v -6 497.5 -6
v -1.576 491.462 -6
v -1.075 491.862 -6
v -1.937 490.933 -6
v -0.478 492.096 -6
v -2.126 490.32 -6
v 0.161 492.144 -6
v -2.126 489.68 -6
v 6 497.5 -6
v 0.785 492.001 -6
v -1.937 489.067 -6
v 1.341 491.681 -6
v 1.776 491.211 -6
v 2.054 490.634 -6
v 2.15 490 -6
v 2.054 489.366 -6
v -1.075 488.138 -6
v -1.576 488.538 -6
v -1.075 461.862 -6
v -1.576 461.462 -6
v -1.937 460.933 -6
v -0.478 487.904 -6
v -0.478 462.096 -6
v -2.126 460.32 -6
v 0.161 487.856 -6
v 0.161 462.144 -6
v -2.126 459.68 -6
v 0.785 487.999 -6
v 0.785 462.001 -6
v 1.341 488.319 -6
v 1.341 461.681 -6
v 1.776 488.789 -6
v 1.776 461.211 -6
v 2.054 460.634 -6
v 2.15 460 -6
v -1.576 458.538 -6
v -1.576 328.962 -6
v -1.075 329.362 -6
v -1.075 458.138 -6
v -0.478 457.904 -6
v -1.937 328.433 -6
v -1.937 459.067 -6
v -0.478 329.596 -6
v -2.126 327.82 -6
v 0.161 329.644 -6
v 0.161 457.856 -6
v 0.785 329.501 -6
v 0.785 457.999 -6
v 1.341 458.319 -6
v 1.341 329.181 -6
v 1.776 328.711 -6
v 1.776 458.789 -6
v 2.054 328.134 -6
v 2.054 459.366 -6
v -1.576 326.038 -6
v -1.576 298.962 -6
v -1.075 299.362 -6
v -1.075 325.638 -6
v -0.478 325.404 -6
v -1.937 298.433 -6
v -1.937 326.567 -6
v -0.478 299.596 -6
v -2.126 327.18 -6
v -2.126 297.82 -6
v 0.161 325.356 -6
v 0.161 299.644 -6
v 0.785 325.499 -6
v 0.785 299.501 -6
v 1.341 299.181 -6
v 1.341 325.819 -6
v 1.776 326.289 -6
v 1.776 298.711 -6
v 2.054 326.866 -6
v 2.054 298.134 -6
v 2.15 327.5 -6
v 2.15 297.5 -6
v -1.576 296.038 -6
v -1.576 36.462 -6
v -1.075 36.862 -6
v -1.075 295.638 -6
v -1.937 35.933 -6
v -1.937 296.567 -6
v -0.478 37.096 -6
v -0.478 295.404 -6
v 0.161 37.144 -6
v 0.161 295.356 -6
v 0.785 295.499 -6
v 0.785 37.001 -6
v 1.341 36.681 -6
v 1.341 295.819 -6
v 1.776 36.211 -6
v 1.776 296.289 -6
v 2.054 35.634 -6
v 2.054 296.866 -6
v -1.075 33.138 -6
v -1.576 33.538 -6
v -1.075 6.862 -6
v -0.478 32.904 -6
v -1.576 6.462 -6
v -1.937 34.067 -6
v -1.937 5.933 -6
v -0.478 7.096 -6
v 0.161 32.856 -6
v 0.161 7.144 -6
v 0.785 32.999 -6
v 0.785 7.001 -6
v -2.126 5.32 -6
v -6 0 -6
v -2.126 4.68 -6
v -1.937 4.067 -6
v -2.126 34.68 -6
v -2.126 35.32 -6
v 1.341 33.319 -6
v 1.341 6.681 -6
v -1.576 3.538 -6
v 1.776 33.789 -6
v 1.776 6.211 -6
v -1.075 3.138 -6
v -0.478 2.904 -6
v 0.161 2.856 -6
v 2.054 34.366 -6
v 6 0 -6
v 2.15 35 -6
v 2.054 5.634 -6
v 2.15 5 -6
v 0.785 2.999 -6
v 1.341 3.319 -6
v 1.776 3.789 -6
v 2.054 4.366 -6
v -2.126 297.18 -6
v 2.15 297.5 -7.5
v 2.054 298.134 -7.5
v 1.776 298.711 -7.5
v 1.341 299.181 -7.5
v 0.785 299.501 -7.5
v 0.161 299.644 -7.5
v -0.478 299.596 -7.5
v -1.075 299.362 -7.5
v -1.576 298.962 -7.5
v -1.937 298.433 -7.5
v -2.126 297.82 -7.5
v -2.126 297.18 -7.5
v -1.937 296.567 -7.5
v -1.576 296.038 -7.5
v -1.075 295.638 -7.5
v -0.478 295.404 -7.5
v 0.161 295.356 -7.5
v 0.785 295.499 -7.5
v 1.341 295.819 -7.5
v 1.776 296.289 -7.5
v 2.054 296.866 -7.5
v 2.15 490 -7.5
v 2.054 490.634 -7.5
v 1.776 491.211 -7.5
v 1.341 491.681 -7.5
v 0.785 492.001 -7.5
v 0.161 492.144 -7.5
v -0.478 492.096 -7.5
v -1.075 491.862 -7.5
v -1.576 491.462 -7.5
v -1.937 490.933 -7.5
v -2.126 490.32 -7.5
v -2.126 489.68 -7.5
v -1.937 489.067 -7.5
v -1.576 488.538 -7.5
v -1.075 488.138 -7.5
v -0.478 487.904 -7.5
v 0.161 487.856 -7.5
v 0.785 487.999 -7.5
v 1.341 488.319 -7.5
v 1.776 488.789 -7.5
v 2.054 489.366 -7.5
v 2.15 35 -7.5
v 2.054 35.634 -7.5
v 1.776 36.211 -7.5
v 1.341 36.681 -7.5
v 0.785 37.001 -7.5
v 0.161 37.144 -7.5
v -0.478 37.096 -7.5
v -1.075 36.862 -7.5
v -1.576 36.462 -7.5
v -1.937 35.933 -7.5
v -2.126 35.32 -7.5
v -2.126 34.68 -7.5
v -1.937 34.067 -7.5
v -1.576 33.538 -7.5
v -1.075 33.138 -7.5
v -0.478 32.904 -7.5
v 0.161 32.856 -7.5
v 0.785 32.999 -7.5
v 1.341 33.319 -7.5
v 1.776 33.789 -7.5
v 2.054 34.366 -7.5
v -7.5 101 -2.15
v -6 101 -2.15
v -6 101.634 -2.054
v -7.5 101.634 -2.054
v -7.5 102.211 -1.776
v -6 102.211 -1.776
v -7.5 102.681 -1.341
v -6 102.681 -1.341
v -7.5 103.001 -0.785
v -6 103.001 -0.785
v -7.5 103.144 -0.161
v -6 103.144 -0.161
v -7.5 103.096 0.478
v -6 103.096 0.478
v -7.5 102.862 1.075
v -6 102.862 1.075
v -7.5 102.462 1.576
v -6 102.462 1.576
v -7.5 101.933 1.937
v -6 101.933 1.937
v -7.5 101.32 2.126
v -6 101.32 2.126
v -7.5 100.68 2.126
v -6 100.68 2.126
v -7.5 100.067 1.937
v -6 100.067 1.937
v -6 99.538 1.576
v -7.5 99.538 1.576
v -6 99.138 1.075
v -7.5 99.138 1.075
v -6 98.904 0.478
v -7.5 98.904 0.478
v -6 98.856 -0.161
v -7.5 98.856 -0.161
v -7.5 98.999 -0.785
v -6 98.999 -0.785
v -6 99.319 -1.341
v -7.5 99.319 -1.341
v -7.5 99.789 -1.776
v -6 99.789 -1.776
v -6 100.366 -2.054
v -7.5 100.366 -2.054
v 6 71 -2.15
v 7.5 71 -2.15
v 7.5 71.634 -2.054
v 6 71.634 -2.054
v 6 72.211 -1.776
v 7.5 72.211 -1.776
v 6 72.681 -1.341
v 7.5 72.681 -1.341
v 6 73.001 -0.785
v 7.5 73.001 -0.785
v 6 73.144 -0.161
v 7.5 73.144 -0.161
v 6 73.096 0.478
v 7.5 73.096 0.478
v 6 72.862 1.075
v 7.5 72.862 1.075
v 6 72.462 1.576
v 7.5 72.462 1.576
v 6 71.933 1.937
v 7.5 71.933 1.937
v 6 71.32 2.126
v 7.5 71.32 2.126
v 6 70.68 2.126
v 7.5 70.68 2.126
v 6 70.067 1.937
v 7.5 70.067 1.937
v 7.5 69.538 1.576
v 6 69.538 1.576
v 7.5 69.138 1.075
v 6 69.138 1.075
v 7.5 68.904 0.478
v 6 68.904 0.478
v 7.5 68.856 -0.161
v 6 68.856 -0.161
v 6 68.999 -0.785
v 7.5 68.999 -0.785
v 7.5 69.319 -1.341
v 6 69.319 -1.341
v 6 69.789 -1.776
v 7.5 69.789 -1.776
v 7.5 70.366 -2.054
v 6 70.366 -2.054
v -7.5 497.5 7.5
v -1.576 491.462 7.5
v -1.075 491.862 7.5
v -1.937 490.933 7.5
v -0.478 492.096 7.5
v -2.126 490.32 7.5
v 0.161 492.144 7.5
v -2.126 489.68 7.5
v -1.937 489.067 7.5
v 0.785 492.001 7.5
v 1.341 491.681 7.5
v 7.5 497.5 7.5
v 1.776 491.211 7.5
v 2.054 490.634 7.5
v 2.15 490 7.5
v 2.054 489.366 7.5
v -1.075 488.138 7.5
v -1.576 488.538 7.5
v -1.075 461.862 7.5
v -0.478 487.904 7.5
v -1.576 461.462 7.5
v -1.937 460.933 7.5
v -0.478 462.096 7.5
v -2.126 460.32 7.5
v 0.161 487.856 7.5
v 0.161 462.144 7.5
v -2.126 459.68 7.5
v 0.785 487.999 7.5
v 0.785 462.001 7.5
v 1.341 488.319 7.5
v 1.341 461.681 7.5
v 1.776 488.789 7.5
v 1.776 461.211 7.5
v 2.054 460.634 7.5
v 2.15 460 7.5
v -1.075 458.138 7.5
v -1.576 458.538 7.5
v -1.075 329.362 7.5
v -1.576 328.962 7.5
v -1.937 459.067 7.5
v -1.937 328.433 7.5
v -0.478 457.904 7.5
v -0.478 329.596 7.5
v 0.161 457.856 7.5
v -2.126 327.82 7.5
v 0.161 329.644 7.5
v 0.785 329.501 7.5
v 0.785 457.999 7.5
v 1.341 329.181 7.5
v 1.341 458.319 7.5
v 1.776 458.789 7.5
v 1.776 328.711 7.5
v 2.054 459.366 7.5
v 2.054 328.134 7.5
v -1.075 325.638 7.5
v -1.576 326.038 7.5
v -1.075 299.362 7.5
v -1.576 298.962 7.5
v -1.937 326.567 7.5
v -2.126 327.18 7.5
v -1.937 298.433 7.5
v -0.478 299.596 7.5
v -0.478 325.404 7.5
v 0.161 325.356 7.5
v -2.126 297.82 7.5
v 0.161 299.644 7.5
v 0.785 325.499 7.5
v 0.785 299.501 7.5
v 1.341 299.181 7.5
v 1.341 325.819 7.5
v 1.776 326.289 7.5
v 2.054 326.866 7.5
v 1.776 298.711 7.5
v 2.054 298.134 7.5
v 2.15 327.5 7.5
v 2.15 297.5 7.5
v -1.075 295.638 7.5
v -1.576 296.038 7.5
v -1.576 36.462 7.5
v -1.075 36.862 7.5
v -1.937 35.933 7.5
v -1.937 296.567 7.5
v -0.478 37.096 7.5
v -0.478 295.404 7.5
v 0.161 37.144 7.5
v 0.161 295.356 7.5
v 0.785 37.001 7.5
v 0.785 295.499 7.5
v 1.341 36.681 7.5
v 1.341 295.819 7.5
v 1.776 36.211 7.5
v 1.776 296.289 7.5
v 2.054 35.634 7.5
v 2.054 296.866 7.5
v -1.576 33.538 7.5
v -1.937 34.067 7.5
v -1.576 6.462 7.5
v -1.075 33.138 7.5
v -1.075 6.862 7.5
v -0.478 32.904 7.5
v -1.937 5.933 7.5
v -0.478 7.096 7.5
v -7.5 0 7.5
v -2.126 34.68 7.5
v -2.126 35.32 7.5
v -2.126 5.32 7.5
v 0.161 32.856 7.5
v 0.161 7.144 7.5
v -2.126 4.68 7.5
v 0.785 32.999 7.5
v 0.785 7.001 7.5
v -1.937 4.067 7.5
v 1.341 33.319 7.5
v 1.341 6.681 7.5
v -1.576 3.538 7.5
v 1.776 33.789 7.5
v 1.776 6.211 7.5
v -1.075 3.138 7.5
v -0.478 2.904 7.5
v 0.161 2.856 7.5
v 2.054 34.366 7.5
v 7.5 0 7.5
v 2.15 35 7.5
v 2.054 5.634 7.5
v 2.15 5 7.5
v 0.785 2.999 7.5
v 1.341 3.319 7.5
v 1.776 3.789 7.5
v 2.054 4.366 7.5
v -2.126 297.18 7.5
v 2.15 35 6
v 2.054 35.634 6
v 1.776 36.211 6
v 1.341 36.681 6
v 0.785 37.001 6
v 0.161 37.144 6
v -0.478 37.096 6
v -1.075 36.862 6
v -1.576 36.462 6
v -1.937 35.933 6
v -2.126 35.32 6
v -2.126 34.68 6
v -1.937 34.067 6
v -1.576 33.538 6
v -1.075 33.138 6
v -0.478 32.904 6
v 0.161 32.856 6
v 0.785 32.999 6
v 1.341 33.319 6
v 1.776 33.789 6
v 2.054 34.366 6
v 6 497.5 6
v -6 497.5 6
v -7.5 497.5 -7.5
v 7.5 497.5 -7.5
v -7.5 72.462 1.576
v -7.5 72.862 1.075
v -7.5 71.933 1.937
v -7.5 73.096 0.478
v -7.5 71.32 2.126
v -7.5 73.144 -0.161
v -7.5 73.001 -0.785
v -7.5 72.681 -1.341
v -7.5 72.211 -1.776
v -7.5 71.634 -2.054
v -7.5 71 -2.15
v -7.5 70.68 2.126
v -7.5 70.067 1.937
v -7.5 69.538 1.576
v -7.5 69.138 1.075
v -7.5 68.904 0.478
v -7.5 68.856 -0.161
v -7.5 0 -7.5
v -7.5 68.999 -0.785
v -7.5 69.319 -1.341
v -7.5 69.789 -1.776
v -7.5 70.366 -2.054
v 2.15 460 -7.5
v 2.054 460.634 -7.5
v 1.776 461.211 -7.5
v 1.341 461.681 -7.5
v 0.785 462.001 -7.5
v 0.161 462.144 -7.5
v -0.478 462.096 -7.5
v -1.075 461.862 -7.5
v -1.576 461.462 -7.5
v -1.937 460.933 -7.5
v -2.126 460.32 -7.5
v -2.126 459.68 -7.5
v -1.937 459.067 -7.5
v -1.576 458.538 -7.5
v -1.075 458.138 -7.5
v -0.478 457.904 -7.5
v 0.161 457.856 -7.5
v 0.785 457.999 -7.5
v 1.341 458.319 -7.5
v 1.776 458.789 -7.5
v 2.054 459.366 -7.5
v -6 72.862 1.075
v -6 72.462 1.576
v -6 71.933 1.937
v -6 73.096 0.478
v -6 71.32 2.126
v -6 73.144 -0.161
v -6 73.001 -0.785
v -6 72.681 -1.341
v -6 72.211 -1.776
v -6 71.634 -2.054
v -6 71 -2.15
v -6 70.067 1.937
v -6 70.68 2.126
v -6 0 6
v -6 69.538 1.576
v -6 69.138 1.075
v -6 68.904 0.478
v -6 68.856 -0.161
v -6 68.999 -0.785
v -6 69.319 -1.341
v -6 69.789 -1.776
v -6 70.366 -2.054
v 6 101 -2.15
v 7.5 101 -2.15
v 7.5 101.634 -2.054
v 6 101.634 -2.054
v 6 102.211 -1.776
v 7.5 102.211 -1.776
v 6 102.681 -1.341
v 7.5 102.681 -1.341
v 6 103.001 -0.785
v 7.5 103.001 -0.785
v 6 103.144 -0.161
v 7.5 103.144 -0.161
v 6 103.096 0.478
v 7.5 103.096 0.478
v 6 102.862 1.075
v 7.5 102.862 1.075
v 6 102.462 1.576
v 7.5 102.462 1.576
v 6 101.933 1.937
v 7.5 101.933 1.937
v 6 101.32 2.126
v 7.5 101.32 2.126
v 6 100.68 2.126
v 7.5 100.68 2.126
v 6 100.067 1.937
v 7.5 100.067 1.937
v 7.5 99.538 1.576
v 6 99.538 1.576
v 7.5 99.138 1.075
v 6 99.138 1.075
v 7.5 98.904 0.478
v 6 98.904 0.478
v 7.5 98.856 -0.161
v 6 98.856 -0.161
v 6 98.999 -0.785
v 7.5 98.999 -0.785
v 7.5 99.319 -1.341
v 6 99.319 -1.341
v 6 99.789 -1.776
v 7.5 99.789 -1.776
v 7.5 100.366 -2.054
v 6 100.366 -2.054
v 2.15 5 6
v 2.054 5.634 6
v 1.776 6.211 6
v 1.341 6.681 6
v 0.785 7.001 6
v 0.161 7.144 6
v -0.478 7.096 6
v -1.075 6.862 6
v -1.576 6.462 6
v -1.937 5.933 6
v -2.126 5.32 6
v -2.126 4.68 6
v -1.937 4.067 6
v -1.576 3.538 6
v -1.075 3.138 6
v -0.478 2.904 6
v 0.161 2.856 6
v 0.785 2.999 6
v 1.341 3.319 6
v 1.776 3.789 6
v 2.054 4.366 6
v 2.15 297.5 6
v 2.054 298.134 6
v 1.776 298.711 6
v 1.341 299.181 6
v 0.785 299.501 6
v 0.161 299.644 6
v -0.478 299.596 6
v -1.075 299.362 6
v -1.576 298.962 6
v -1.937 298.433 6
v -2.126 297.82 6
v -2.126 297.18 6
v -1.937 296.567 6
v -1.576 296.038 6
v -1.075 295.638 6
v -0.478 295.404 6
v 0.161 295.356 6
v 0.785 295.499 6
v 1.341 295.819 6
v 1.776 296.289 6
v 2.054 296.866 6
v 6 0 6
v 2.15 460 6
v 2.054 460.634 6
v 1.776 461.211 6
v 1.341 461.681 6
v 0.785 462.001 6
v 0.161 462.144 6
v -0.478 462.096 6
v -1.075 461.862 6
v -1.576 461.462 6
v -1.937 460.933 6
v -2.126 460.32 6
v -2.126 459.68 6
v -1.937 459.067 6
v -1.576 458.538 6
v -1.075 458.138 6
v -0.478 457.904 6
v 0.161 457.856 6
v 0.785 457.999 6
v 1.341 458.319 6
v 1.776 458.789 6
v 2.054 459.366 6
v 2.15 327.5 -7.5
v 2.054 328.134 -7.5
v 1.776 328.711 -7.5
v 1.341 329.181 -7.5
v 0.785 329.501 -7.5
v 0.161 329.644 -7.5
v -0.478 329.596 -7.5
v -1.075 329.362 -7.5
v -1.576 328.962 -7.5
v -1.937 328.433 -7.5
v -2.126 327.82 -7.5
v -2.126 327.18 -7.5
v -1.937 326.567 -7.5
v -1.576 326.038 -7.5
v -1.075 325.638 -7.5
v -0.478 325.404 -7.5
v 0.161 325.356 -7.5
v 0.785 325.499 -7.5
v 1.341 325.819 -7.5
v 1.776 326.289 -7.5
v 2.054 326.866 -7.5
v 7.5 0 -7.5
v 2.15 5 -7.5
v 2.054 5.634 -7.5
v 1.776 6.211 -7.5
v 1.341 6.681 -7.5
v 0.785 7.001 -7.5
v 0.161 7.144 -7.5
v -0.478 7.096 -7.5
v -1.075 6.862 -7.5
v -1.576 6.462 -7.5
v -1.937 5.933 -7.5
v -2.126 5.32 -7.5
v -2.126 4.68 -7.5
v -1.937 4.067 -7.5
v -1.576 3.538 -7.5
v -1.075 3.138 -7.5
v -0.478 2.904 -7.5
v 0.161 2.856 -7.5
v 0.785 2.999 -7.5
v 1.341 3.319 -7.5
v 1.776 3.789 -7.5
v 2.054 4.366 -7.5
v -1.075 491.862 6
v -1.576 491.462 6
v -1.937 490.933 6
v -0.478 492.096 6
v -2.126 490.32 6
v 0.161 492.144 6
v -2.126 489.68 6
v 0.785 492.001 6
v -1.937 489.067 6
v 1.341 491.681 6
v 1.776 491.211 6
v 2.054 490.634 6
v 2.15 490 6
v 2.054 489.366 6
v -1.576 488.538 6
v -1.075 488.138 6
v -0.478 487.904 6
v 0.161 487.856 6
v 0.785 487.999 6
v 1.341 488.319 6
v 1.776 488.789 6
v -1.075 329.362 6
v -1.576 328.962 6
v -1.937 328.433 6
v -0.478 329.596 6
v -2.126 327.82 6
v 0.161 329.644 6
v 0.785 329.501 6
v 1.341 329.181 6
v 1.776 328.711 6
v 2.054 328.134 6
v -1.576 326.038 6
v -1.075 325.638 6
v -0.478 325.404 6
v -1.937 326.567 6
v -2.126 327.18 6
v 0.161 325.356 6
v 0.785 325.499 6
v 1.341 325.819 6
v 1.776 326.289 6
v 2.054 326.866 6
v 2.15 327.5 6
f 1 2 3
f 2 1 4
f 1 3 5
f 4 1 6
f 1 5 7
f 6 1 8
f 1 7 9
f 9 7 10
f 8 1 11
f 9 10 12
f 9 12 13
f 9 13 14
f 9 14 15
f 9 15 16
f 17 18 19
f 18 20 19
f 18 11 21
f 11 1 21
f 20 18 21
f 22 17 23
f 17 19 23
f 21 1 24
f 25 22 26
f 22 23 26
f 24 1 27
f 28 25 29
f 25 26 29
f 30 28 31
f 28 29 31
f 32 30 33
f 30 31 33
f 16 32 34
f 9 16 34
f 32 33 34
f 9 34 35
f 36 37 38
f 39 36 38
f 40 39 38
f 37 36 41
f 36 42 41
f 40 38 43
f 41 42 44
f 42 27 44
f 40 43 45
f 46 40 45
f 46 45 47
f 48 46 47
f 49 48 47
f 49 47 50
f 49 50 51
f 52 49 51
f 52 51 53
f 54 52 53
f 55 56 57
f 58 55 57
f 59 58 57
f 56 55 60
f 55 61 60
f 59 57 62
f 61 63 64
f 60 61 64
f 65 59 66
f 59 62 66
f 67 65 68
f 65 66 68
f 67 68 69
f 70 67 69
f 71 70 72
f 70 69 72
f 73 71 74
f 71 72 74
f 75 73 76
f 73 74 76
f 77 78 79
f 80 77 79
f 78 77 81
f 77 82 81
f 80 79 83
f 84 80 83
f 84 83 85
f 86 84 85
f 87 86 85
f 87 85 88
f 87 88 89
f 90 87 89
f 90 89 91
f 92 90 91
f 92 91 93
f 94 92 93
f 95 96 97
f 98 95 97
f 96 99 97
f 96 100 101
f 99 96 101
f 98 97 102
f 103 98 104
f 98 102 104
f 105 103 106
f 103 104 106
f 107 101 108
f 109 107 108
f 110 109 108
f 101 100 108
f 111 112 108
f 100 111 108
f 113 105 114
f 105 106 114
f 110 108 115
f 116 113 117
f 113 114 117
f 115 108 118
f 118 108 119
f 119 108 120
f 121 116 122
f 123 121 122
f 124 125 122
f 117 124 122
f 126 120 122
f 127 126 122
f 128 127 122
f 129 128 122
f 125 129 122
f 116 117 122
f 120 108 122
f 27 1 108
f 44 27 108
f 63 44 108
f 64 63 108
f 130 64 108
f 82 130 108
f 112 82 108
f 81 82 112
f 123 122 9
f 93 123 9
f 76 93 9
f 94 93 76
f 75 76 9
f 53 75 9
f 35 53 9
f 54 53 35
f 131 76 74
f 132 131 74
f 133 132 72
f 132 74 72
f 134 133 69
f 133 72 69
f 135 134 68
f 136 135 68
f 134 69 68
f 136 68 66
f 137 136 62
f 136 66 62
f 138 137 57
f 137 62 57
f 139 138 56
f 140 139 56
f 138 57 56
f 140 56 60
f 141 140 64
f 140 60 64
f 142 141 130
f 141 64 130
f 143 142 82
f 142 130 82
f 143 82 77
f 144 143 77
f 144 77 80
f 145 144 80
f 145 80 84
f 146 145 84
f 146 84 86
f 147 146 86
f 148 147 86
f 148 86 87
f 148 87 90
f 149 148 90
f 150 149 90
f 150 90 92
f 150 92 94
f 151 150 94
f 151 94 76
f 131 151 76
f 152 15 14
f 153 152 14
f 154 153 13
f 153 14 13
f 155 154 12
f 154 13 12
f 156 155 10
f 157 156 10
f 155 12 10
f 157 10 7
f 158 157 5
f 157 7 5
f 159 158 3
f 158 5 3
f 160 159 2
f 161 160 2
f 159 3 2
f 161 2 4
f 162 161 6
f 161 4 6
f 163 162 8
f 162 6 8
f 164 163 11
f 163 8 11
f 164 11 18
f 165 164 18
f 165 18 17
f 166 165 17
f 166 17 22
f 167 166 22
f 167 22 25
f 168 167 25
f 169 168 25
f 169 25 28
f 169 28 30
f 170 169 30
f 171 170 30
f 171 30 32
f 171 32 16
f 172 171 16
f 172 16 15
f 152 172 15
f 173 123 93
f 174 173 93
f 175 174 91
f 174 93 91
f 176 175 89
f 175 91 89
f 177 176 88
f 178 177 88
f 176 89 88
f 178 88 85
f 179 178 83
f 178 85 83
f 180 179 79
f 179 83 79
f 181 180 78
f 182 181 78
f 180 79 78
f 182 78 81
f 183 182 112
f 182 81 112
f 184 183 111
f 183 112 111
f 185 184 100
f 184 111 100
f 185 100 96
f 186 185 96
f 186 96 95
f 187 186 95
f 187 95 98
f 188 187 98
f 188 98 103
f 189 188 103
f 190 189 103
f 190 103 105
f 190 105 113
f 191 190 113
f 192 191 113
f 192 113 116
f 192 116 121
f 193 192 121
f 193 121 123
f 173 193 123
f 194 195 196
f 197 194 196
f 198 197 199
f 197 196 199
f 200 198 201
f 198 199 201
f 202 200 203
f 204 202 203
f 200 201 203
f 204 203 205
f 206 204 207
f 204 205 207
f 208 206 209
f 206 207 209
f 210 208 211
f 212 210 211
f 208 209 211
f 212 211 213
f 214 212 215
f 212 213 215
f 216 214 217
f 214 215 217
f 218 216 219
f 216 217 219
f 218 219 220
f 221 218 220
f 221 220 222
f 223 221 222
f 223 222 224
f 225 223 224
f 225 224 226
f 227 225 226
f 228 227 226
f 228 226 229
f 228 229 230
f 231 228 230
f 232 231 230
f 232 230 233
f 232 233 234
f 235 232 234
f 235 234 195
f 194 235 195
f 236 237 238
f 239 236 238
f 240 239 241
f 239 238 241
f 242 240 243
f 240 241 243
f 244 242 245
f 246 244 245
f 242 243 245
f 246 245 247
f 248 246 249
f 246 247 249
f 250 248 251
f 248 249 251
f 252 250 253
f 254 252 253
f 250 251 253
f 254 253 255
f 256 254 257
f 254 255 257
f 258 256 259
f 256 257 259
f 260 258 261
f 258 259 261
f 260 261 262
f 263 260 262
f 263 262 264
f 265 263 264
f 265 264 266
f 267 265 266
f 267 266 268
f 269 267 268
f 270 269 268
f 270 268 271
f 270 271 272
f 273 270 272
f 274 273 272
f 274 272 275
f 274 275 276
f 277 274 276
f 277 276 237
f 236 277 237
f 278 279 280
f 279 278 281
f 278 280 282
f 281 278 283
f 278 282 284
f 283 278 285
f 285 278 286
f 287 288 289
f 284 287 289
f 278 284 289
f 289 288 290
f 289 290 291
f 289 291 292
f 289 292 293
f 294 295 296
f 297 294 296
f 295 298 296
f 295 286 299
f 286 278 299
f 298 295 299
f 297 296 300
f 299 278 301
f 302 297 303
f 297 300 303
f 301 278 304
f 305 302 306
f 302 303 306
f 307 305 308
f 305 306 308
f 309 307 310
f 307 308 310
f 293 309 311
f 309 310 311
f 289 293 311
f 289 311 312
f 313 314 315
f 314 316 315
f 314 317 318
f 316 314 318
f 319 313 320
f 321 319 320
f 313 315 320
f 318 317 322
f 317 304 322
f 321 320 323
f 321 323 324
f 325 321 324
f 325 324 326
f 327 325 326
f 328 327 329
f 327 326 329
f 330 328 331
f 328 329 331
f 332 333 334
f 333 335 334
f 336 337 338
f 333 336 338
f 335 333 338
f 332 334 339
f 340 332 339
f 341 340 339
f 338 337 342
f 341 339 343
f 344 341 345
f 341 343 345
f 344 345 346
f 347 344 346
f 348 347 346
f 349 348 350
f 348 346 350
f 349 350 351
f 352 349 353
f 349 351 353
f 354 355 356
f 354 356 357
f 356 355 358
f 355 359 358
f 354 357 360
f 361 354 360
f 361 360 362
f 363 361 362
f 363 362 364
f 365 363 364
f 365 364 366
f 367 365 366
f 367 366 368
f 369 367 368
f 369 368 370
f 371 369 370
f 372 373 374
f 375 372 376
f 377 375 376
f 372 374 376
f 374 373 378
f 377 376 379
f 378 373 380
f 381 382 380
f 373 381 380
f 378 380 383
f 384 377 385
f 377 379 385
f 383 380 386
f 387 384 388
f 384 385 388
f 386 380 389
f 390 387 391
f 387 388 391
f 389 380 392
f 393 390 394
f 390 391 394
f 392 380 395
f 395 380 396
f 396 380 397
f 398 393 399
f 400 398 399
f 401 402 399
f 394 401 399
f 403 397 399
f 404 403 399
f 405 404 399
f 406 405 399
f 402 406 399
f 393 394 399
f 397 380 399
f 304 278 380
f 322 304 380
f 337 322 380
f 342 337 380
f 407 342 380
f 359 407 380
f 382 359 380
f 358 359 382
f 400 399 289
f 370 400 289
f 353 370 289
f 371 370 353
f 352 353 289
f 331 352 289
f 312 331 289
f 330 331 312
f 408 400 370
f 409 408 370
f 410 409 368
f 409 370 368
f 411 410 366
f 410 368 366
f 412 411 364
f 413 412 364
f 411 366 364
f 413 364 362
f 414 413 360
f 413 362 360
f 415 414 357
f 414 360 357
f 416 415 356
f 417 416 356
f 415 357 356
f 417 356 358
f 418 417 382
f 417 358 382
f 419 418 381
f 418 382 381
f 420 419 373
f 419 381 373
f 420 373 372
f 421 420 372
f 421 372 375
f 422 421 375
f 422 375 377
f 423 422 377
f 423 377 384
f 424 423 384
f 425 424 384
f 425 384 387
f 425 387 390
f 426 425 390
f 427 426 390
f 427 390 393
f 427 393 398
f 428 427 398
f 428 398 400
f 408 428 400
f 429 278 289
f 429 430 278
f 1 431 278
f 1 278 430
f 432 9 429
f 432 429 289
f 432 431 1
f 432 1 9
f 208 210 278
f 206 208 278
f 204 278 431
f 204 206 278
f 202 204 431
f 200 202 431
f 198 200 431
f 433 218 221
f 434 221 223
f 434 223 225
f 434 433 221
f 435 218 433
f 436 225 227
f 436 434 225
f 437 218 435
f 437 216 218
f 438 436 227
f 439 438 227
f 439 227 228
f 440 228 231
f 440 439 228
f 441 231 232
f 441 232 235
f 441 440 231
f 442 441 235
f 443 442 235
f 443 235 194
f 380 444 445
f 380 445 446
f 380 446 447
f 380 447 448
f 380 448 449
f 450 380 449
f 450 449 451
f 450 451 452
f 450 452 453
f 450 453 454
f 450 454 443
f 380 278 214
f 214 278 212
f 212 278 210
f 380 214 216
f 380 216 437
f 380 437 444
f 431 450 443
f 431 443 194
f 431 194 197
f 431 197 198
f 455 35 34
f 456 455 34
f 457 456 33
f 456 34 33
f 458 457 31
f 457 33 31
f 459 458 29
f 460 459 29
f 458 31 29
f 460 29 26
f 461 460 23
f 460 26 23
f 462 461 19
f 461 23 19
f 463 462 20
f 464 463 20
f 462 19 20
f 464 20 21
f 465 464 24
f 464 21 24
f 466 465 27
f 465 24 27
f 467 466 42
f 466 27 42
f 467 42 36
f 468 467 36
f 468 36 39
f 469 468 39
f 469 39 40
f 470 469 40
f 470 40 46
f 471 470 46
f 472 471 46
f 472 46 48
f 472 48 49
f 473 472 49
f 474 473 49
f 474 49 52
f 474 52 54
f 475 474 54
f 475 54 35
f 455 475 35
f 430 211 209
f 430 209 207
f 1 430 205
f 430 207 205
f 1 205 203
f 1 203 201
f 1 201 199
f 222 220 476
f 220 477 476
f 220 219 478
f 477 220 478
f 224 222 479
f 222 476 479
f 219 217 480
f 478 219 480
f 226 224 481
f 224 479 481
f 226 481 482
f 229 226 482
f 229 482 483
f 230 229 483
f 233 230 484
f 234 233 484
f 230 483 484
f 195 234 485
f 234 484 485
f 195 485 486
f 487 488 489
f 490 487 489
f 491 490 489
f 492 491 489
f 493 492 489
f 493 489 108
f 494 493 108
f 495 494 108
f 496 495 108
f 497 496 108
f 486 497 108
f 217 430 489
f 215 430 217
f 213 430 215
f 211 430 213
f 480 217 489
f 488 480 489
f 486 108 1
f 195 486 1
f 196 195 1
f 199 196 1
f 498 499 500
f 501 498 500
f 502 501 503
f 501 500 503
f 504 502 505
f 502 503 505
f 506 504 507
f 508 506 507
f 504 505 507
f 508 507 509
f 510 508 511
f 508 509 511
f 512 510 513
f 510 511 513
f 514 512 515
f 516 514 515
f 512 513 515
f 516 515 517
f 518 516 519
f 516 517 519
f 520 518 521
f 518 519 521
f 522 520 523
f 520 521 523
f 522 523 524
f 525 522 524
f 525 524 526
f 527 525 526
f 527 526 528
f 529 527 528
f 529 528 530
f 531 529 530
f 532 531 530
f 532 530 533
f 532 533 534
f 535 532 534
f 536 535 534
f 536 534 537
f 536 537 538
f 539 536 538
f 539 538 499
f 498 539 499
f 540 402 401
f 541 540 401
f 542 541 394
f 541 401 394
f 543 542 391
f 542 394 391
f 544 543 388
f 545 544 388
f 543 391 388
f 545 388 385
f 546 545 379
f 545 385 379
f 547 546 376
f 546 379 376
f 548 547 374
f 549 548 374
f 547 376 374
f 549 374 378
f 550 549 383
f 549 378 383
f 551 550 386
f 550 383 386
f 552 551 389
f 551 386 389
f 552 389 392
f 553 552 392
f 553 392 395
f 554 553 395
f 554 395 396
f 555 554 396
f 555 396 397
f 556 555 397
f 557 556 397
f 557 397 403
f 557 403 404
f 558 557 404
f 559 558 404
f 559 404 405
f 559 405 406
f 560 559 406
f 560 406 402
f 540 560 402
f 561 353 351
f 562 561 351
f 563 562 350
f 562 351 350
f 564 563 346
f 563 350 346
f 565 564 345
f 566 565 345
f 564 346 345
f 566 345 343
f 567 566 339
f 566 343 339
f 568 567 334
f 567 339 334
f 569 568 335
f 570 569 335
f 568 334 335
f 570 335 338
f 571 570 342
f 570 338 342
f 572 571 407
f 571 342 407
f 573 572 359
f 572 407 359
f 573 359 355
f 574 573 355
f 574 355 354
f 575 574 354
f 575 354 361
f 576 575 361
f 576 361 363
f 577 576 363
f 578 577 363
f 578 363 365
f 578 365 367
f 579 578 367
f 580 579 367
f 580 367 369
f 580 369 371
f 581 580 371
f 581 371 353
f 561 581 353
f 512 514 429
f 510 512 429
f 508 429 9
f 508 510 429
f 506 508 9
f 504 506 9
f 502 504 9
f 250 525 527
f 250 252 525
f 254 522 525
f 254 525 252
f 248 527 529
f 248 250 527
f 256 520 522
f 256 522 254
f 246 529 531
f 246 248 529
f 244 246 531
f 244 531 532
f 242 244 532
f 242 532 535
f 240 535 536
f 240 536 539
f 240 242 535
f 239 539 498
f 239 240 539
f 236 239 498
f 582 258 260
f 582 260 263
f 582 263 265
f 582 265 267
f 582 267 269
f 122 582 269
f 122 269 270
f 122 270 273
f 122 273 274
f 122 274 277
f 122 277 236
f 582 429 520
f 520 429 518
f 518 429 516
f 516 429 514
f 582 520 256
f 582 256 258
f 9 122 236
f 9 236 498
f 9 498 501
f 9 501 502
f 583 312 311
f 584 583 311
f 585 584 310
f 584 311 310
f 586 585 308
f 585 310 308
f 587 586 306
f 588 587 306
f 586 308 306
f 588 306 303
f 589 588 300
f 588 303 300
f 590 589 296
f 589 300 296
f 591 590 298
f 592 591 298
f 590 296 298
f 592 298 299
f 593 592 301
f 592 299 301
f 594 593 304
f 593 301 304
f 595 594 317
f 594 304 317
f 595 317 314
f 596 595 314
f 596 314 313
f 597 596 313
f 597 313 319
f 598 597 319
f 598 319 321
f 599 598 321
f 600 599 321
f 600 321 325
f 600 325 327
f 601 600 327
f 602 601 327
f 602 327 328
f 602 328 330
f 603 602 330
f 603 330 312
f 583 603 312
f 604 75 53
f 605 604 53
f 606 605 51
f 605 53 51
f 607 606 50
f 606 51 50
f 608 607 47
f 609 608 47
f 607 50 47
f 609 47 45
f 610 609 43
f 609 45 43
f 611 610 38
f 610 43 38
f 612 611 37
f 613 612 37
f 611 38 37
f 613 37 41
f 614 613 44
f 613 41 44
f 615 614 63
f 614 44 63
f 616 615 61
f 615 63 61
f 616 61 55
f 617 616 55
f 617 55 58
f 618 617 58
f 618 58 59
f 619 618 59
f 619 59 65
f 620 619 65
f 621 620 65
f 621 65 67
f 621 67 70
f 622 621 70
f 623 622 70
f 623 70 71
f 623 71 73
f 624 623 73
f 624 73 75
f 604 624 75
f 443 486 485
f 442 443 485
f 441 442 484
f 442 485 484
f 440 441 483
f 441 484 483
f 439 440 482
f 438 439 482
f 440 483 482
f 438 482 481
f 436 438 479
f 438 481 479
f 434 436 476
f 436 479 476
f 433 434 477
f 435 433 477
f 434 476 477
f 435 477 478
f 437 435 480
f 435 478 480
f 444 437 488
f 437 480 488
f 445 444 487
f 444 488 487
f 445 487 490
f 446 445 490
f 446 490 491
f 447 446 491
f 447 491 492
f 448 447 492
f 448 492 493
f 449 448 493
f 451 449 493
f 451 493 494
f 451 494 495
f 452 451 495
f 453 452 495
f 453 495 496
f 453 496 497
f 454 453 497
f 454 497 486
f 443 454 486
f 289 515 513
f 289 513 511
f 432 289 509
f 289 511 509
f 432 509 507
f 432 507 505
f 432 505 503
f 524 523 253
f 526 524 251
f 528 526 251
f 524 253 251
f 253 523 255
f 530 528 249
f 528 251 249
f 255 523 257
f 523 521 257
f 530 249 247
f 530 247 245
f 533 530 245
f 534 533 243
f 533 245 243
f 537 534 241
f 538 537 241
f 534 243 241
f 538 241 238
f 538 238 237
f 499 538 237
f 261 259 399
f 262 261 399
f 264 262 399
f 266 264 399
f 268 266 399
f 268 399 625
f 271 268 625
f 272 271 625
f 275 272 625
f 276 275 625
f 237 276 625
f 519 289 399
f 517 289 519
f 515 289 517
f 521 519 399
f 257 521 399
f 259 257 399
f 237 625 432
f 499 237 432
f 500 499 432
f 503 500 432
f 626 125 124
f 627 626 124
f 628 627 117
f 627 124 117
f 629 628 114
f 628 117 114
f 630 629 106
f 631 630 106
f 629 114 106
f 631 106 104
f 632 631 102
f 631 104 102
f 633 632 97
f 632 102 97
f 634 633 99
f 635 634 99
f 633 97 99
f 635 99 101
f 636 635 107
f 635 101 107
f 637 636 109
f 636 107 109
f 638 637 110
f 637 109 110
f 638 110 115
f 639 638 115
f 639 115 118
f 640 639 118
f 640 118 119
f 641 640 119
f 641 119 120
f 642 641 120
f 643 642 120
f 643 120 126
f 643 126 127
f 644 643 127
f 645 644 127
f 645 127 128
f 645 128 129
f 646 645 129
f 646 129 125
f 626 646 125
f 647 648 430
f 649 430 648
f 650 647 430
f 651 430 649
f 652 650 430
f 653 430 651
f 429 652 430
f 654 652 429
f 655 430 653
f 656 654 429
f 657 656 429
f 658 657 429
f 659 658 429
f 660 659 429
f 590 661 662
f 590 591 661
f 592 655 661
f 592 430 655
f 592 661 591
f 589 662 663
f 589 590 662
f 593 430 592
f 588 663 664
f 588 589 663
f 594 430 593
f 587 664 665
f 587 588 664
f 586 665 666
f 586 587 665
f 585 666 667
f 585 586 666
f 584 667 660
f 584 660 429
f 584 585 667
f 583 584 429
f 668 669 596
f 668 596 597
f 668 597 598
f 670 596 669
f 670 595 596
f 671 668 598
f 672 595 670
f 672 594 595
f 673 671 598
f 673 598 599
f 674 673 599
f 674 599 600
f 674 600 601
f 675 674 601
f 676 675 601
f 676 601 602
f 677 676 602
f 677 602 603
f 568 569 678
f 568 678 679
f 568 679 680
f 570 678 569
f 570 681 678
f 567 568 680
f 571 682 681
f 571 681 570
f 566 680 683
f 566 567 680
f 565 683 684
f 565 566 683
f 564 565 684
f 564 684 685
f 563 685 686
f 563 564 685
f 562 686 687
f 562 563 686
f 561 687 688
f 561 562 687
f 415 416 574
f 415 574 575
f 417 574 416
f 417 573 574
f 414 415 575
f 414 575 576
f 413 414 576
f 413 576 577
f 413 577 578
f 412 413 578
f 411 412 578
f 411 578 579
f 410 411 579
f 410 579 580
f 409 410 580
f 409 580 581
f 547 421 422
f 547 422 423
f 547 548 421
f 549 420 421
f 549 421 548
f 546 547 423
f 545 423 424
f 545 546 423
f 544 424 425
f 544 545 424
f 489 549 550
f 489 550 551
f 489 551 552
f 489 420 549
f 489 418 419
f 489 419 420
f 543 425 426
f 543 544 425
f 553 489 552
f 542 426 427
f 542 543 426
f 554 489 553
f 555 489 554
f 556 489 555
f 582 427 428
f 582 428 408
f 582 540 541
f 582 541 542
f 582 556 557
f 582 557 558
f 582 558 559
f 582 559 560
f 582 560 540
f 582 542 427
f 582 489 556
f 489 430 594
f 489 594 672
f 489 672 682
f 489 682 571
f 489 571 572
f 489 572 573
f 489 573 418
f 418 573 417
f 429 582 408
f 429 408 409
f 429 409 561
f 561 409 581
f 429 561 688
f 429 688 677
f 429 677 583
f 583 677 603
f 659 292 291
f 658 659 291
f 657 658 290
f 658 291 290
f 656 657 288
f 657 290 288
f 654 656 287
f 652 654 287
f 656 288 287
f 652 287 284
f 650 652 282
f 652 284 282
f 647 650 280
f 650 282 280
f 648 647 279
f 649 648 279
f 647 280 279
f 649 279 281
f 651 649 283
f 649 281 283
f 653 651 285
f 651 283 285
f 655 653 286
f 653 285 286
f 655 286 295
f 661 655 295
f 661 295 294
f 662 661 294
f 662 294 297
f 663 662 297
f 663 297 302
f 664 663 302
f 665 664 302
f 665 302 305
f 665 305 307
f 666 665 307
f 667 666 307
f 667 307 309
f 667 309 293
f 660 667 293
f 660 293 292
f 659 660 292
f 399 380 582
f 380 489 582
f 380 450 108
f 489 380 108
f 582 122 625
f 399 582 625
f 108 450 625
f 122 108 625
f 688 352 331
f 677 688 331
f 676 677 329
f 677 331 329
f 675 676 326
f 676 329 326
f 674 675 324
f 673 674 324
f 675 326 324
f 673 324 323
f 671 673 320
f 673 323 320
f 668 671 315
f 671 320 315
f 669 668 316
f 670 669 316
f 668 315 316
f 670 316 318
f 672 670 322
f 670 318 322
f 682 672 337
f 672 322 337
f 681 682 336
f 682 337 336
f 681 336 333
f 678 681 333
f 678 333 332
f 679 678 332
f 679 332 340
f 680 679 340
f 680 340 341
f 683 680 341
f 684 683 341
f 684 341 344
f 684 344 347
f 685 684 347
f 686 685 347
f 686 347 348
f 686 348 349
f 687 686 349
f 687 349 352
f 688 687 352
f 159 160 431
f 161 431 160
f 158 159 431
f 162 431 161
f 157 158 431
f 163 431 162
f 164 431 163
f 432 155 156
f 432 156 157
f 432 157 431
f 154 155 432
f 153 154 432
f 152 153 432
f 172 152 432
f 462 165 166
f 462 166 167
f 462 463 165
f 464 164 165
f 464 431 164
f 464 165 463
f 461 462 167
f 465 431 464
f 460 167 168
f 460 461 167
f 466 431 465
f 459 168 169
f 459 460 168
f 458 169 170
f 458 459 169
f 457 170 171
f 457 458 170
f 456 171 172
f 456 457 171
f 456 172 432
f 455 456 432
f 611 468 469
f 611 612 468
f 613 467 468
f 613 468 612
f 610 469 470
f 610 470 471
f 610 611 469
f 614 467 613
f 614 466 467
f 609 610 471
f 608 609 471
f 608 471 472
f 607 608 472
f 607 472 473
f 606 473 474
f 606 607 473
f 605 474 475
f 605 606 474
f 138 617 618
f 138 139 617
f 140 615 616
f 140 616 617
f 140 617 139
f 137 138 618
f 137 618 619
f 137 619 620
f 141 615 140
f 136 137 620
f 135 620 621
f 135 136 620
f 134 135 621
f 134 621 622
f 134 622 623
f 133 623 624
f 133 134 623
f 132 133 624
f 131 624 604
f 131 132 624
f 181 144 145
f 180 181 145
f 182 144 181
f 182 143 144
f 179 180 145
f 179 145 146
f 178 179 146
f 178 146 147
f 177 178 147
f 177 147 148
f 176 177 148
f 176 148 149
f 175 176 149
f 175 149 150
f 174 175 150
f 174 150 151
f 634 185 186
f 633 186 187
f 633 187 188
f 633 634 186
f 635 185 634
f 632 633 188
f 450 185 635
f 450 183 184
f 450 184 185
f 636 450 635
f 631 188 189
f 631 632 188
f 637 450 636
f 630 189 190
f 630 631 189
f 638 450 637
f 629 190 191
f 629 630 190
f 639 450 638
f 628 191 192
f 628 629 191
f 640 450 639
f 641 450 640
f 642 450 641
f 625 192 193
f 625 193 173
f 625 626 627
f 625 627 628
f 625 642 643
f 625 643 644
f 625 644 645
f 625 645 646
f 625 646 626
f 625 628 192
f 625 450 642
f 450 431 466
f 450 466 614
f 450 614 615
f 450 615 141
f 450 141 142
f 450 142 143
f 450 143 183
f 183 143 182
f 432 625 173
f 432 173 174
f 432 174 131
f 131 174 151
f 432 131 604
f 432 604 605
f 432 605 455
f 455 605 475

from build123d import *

# Parameters (mm, degrees)
SKETCH_1_W          = 15
SKETCH_1_H          = 15
SKETCH_1_W_2        = 12
SKETCH_1_H_2        = 12
EXTRUDE_1_DEPTH     = 497.5
SKETCH_2_R          = 2.15
CUT_EXTRUDE_1_DEPTH = 498.782583062
SKETCH_3_R          = 2.15
CUT_EXTRUDE_2_DEPTH = 498.782583062


with BuildPart() as part:
    # ｽｹｯﾁ1 → 押し出し-薄板1 (new body)
    with BuildSketch(Plane(origin=(0, 0, 0), x_dir=(1, 0, 0), z_dir=(0, 1, 0))):
        Rectangle(SKETCH_1_W, SKETCH_1_H)
        Rectangle(SKETCH_1_W_2, SKETCH_1_H_2, mode=Mode.SUBTRACT)
    extrude(amount=EXTRUDE_1_DEPTH)

    # ｽｹｯﾁ2 → ｶｯﾄ - 押し出し1 (cut, through all)
    with BuildSketch(Plane(origin=(7.5, 0, 0), x_dir=(0, 0, -1), z_dir=(1, 0, 0))):
        with Locations((0, 71)):
            Circle(SKETCH_2_R)
        with Locations((0, 101)):
            Circle(SKETCH_2_R)
    extrude(amount=-CUT_EXTRUDE_1_DEPTH, mode=Mode.SUBTRACT)

    # ｽｹｯﾁ3 → ｶｯﾄ - 押し出し2 (cut, through all)
    with BuildSketch(Plane.XY.offset(7.5)):
        with Locations((0, 35)):
            Circle(SKETCH_3_R)
        with Locations((0, 5)):
            Circle(SKETCH_3_R)
        with Locations((0, 297.5)):
            Circle(SKETCH_3_R)
        with Locations((0, 327.5)):
            Circle(SKETCH_3_R)
        with Locations((0, 490)):
            Circle(SKETCH_3_R)
        with Locations((0, 460)):
            Circle(SKETCH_3_R)
    extrude(amount=-CUT_EXTRUDE_2_DEPTH, mode=Mode.SUBTRACT)


solid = part.part
